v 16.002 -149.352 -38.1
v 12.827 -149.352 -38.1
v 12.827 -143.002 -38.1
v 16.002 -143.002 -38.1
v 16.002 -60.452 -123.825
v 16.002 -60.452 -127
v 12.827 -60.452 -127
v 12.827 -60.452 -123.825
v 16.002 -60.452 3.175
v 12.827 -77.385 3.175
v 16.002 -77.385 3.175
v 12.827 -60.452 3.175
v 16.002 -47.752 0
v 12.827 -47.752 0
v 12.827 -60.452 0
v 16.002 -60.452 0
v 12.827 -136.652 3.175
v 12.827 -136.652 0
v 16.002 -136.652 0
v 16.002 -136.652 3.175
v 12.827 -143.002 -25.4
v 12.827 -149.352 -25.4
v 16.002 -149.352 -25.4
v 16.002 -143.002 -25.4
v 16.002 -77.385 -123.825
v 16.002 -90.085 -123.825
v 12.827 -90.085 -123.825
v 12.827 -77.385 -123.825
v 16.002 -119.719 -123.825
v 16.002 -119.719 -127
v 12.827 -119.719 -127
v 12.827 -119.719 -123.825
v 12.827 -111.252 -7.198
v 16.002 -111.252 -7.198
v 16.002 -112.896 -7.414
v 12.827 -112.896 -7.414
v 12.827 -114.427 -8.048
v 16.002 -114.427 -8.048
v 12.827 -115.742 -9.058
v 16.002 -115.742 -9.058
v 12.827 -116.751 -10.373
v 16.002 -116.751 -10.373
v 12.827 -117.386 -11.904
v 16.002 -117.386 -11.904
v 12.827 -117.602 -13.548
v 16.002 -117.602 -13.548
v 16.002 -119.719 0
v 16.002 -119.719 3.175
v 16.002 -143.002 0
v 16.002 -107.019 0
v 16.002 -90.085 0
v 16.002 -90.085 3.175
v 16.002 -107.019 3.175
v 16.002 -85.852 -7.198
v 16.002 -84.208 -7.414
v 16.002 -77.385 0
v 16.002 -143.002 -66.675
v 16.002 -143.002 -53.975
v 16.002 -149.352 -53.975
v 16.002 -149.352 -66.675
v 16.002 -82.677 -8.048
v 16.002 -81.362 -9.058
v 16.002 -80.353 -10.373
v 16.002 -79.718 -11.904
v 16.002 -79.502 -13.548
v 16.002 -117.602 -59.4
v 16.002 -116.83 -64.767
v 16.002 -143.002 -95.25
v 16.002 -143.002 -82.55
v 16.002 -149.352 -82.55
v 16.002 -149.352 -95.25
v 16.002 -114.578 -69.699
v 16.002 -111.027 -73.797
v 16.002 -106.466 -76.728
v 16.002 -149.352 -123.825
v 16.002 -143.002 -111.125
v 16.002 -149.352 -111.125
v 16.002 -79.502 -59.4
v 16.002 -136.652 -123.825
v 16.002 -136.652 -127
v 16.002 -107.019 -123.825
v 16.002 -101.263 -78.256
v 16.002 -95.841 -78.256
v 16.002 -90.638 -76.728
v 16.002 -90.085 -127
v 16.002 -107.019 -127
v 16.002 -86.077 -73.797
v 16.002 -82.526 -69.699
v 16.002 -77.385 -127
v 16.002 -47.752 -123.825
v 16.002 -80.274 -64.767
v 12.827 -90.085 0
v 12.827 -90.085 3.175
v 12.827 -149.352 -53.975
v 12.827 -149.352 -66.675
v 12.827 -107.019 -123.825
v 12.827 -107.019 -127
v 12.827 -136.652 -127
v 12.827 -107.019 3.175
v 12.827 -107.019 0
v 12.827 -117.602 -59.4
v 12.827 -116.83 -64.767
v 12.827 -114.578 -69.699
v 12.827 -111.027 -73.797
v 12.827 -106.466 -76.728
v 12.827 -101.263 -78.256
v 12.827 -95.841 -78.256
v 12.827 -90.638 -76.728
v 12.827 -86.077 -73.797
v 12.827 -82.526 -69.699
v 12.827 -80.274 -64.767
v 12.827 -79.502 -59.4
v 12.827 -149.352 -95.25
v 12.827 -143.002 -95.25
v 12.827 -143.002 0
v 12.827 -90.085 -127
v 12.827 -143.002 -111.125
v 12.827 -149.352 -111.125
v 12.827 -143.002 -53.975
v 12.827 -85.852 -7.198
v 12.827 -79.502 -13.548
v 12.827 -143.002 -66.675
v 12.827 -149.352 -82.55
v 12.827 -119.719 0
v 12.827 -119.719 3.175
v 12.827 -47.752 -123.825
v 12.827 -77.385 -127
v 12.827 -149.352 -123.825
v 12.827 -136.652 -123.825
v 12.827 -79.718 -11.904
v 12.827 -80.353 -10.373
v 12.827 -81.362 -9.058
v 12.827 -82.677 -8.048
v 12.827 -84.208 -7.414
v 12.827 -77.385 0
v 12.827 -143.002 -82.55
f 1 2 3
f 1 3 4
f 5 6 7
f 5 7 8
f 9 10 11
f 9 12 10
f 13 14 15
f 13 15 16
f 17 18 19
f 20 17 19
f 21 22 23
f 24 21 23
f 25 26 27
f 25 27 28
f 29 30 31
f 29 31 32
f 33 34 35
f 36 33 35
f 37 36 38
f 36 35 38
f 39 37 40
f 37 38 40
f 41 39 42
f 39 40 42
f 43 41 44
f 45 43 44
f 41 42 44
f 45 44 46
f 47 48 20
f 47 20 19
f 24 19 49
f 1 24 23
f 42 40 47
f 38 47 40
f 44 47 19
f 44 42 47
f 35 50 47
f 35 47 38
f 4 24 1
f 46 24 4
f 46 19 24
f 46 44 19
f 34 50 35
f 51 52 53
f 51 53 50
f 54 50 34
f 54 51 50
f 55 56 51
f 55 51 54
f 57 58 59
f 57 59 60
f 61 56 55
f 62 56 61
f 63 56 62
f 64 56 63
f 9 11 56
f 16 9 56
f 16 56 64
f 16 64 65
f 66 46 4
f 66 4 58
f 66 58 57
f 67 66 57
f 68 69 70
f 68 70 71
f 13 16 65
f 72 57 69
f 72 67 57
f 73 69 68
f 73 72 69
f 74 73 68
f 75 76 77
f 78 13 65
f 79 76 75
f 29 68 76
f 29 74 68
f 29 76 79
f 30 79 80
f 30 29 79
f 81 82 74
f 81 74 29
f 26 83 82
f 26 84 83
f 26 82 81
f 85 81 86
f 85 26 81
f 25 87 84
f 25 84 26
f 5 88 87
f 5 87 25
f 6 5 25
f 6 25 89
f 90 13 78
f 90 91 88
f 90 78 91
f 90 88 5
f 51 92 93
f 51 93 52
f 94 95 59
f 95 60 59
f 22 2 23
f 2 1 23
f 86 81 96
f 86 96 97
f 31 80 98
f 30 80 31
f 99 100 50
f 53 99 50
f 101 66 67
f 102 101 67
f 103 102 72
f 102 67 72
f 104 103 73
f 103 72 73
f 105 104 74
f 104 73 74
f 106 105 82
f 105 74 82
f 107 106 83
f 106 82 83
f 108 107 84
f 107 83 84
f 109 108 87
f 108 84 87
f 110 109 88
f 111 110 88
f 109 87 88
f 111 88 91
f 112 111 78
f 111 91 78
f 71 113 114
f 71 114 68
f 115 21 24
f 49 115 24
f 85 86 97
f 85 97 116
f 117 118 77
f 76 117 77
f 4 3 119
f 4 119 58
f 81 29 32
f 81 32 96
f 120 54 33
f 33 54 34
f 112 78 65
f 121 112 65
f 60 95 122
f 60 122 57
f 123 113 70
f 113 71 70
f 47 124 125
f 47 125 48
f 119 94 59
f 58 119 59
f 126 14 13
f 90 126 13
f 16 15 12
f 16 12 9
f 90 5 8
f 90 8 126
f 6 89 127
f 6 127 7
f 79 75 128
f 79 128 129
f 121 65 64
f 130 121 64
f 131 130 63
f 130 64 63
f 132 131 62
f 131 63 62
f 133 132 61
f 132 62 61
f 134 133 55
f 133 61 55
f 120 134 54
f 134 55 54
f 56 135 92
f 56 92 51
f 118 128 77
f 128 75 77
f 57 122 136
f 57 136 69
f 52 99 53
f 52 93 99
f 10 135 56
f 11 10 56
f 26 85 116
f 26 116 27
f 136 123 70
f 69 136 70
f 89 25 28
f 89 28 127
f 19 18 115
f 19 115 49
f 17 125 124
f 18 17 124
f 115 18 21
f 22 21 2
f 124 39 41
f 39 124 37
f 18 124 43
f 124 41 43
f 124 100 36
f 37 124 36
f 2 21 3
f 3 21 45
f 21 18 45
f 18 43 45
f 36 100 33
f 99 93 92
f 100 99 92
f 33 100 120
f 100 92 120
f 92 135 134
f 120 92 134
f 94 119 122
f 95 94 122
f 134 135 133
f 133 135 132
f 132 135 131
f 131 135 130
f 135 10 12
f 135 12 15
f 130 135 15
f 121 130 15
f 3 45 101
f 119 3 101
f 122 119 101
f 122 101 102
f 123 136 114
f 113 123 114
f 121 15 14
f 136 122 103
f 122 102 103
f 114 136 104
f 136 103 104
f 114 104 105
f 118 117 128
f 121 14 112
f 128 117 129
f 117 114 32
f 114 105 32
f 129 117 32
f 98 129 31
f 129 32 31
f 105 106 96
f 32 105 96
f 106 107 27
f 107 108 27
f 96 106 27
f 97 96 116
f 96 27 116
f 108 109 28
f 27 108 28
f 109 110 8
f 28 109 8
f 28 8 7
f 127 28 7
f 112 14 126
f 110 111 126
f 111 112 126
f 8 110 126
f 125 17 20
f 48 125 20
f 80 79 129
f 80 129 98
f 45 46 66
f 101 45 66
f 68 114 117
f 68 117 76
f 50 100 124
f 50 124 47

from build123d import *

# Parameters (mm, degrees)
SKETCH1_W               = 44.958
SKETCH1_H               = 304.8
BOSS_EXTRUDE1_DEPTH     = 3.175
BOSS_EXTRUDE2_DEPTH     = 3.175
SKETCH3_W               = 123.825
SKETCH3_H               = 6.35
BOSS_EXTRUDE3_DEPTH     = 41.783
SKETCH8_W               = 3.175
SKETCH8_H               = 213.451350416
CUT_EXTRUDE4_DEPTH      = 1
CUT_EXTRUDE4_DEPTH_BACK = 131.175
SKETCH6_W               = 3.175
SKETCH6_H               = 12.7
CUT_EXTRUDE5_DEPTH      = 3.175
SKETCH4_3_W             = 6.35
SKETCH4_3_H             = 15.875
SKETCH4_3_H_2           = 5.588
SKETCH4_3_H_3           = 7.112
CUT_EXTRUDE6_DEPTH      = 6.35
CUT_EXTRUDE7_DEPTH      = 4.175


with BuildPart() as part:
    # Sketch1 → Boss-Extrude1 (new body)
    with BuildSketch(Plane.XY):
        with Locations((-6.477, 3.048)):
            Rectangle(SKETCH1_W, SKETCH1_H)
        with BuildLine():
            Line((-3.302, 133.858), (-3.302, -143.002))
            Line((-3.302, -143.002), (3.302, -143.002))
            Line((3.302, -143.002), (3.302, 143.002))
            Line((3.302, 143.002), (-16.256, 143.002))
            Line((-16.256, 143.002), (-16.256, 136.398))
            Line((-16.256, 136.398), (-5.842, 136.398))
            ThreePointArc((-5.842, 136.398), (-4.045948776, 135.654051224), (-3.302, 133.858))
        make_face(mode=Mode.SUBTRACT)
    extrude(amount=BOSS_EXTRUDE1_DEPTH)

    # Sketch2 → Boss-Extrude2 (add)
    with BuildSketch(Plane(origin=(16.002, 0, 0), x_dir=(0, 0, -1), z_dir=(1, 0, 0))):
        Polygon((123.825, -47.752), (-3.175, -47.752), (-3.175, -149.352), (123.825, -149.352), (123.825, -136.652), (127, -136.652), (127, -119.718666667), (123.825, -119.718666667), (123.825, -107.018666667), (127, -107.018666667), (127, -90.085333333), (123.825, -90.085333333), (123.825, -77.385333333), (127, -77.385333333), (127, -60.452), (123.825, -60.452), align=None)
        with BuildLine():
            ThreePointArc((11.9, -106.092), (10.4, -107.592), (8.9, -106.092))
            Line((8.9, -106.092), (8.9, -101.012))
            ThreePointArc((8.9, -101.012), (10.4, -99.512), (11.9, -101.012))
            Line((11.9, -101.012), (11.9, -106.092))
        make_face(mode=Mode.SUBTRACT)
        with BuildLine():
            ThreePointArc((60.9, -106.092), (59.4, -107.592), (57.9, -106.092))
            Line((57.9, -106.092), (57.9, -101.012))
            ThreePointArc((57.9, -101.012), (59.4, -99.512), (60.9, -101.012))
            Line((60.9, -101.012), (60.9, -106.092))
        make_face(mode=Mode.SUBTRACT)
        with BuildLine():
            Line((8.9, -96.092), (8.9, -91.012))
            ThreePointArc((8.9, -91.012), (10.4, -89.512), (11.9, -91.012))
            Line((11.9, -91.012), (11.9, -96.092))
            ThreePointArc((11.9, -96.092), (10.4, -97.592), (8.9, -96.092))
        make_face(mode=Mode.SUBTRACT)
        with BuildLine():
            ThreePointArc((36.4, -101.092), (25.4, -112.092), (14.4, -101.092))
            Line((14.4, -101.092), (14.4, -96.012))
            ThreePointArc((14.4, -96.012), (25.4, -85.012), (36.4, -96.012))
            Line((36.4, -96.012), (36.4, -101.092))
        make_face(mode=Mode.SUBTRACT)
        with BuildLine():
            ThreePointArc((57.9, -91.012), (59.4, -89.512), (60.9, -91.012))
            Line((60.9, -91.012), (60.9, -96.092))
            ThreePointArc((60.9, -96.092), (59.4, -97.592), (57.9, -96.092))
            Line((57.9, -96.092), (57.9, -91.012))
        make_face(mode=Mode.SUBTRACT)
    extrude(amount=-BOSS_EXTRUDE2_DEPTH)

    # Sketch3 → Boss-Extrude3 (add)
    with BuildSketch(Plane.ZY.offset(-12.827)):
        with Locations((-61.9125, -146.177)):
            Rectangle(SKETCH3_W, SKETCH3_H)
    extrude(amount=BOSS_EXTRUDE3_DEPTH)

    # Sketch8 → Cut-Extrude4 (cut, two sides)
    with BuildSketch(Plane.XY.offset(3.175)) as cut_extrude4_sk:
        Polygon((-28.956, -149.352), (12.827, -149.352), (12.827, -47.752), (12.827, 155.448), (-28.956, 155.448), align=None)
        with BuildLine():
            Line((-16.256, 136.398), (-16.256, 143.002))
            Line((-16.256, 143.002), (3.302, 143.002))
            Line((3.302, 143.002), (3.302, -143.002))
            Line((3.302, -143.002), (-3.302, -143.002))
            Line((-3.302, -143.002), (-3.302, 133.858))
            ThreePointArc((-3.302, 133.858), (-4.045948776, 135.654051224), (-5.842, 136.398))
            Line((-5.842, 136.398), (-16.256, 136.398))
        make_face(mode=Mode.SUBTRACT)
        Polygon((-54.223542679, -149.352), (-28.956, -149.352), (-28.956, 155.448), (12.827, 155.448), (12.827, 165.699350416), (-54.223542679, 165.699350416), align=None)
        with Locations((14.4145, 58.973675208)):
            Rectangle(SKETCH8_W, SKETCH8_H)
    extrude(amount=CUT_EXTRUDE4_DEPTH, mode=Mode.SUBTRACT)
    extrude(cut_extrude4_sk.sketch, amount=-CUT_EXTRUDE4_DEPTH_BACK, mode=Mode.SUBTRACT)

    # Sketch6 → Cut-Extrude5 (cut)
    with BuildSketch(Plane.XY.offset(3.175)):
        with Locations((14.4145, -54.102)):
            Rectangle(SKETCH6_W, SKETCH6_H)
        with Locations((14.4145, -83.735333333)):
            Rectangle(SKETCH6_W, SKETCH6_H)
        with Locations((14.4145, -113.368666667)):
            Rectangle(SKETCH6_W, SKETCH6_H)
        with Locations((14.4145, -143.002)):
            Rectangle(SKETCH6_W, SKETCH6_H)
    extrude(amount=-CUT_EXTRUDE5_DEPTH, mode=Mode.SUBTRACT)

    # Sketch4_3 → Cut-Extrude6 (cut)
    with BuildSketch(Plane.XZ.offset(149.352)):
        with Locations((12.827, -103.1875)):
            Rectangle(SKETCH4_3_W, SKETCH4_3_H)
        with Locations((12.827, -74.6125)):
            Rectangle(SKETCH4_3_W, SKETCH4_3_H)
        with Locations((12.827, -46.0375)):
            Rectangle(SKETCH4_3_W, SKETCH4_3_H)
        with Locations((12.827, -17.4625)):
            Rectangle(SKETCH4_3_W, SKETCH4_3_H)
        with Locations((12.827, 0.381)):
            Rectangle(SKETCH4_3_W, SKETCH4_3_H_2)
        with Locations((12.827, -5.969)):
            Rectangle(SKETCH4_3_W, SKETCH4_3_H_3)
    extrude(amount=-CUT_EXTRUDE6_DEPTH, mode=Mode.SUBTRACT)

    # Sketch9 → Cut-Extrude7 (cut, through all)
    with BuildSketch(Plane(origin=(16.002, 0, 0), x_dir=(0, 0, -1), z_dir=(1, 0, 0))):
        with BuildLine():
            ThreePointArc((7.197741164, -98.552), (12.777356982, -85.081615818), (26.247741164, -79.502))
            Line((26.247741164, -79.502), (13.547741164, -79.502))
            ThreePointArc((13.547741164, -79.502), (9.057613103, -81.361871939), (7.197741164, -85.852))
            Line((7.197741164, -85.852), (7.197741164, -98.552))
        make_face()
        with BuildLine():
            ThreePointArc((26.247741164, -117.602), (12.777356982, -112.022384182), (7.197741164, -98.552))
            Line((7.197741164, -98.552), (7.197741164, -111.252))
            ThreePointArc((7.197741164, -111.252), (9.057613103, -115.742128061), (13.547741164, -117.602))
            Line((13.547741164, -117.602), (26.247741164, -117.602))
        make_face()
        with BuildLine():
            Line((59.4, -79.502), (26.247741164, -79.502))
            ThreePointArc((26.247741164, -79.502), (16.074520569, -82.445849537), (9.045492178, -90.367555619))
            ThreePointArc((9.045492178, -90.367555619), (7.665419684, -94.356785058), (7.197741164, -98.552))
            ThreePointArc((7.197741164, -98.552), (7.665419676, -102.747214908), (9.045492148, -106.736444318))
            ThreePointArc((9.045492148, -106.736444318), (16.07452054, -114.658150444), (26.247741164, -117.602))
            Line((26.247741164, -117.602), (59.4, -117.602))
            ThreePointArc((59.4, -117.602), (78.45, -98.552), (59.4, -79.502))
        make_face()
        with BuildLine():
            ThreePointArc((11.9, -106.092), (10.73033182, -107.555174935), (9.045492148, -106.736444318))
            ThreePointArc((9.045492148, -106.736444318), (8.936825065, -106.42233182), (8.9, -106.092))
            Line((8.9, -106.092), (8.9, -101.012))
            ThreePointArc((8.9, -101.012), (10.4, -99.512), (11.9, -101.012))
            Line((11.9, -101.012), (11.9, -106.092))
        make_face(mode=Mode.SUBTRACT)
        with BuildLine():
            ThreePointArc((14.4, -96.012), (25.4, -85.012), (36.4, -96.012))
            Line((36.4, -96.012), (36.4, -101.092))
            ThreePointArc((36.4, -101.092), (25.4, -112.092), (14.4, -101.092))
            Line((14.4, -101.092), (14.4, -96.012))
        make_face(mode=Mode.SUBTRACT)
        with BuildLine():
            Line((60.9, -101.012), (60.9, -106.092))
            ThreePointArc((60.9, -106.092), (59.4, -107.592), (57.9, -106.092))
            Line((57.9, -106.092), (57.9, -101.012))
            ThreePointArc((57.9, -101.012), (59.4, -99.512), (60.9, -101.012))
        make_face(mode=Mode.SUBTRACT)
        with BuildLine():
            ThreePointArc((8.9, -91.012), (8.936825073, -90.681668146), (9.045492178, -90.367555619))
            ThreePointArc((9.045492178, -90.367555619), (10.730331854, -89.548825073), (11.9, -91.012))
            Line((11.9, -91.012), (11.9, -96.092))
            ThreePointArc((11.9, -96.092), (10.4, -97.592), (8.9, -96.092))
            Line((8.9, -96.092), (8.9, -91.012))
        make_face(mode=Mode.SUBTRACT)
        with BuildLine():
            Line((60.9, -91.012), (60.9, -96.092))
            ThreePointArc((60.9, -96.092), (59.4, -97.592), (57.9, -96.092))
            Line((57.9, -96.092), (57.9, -91.012))
            ThreePointArc((57.9, -91.012), (59.4, -89.512), (60.9, -91.012))
        make_face(mode=Mode.SUBTRACT)
    extrude(amount=-CUT_EXTRUDE7_DEPTH, mode=Mode.SUBTRACT)


solid = part.part
